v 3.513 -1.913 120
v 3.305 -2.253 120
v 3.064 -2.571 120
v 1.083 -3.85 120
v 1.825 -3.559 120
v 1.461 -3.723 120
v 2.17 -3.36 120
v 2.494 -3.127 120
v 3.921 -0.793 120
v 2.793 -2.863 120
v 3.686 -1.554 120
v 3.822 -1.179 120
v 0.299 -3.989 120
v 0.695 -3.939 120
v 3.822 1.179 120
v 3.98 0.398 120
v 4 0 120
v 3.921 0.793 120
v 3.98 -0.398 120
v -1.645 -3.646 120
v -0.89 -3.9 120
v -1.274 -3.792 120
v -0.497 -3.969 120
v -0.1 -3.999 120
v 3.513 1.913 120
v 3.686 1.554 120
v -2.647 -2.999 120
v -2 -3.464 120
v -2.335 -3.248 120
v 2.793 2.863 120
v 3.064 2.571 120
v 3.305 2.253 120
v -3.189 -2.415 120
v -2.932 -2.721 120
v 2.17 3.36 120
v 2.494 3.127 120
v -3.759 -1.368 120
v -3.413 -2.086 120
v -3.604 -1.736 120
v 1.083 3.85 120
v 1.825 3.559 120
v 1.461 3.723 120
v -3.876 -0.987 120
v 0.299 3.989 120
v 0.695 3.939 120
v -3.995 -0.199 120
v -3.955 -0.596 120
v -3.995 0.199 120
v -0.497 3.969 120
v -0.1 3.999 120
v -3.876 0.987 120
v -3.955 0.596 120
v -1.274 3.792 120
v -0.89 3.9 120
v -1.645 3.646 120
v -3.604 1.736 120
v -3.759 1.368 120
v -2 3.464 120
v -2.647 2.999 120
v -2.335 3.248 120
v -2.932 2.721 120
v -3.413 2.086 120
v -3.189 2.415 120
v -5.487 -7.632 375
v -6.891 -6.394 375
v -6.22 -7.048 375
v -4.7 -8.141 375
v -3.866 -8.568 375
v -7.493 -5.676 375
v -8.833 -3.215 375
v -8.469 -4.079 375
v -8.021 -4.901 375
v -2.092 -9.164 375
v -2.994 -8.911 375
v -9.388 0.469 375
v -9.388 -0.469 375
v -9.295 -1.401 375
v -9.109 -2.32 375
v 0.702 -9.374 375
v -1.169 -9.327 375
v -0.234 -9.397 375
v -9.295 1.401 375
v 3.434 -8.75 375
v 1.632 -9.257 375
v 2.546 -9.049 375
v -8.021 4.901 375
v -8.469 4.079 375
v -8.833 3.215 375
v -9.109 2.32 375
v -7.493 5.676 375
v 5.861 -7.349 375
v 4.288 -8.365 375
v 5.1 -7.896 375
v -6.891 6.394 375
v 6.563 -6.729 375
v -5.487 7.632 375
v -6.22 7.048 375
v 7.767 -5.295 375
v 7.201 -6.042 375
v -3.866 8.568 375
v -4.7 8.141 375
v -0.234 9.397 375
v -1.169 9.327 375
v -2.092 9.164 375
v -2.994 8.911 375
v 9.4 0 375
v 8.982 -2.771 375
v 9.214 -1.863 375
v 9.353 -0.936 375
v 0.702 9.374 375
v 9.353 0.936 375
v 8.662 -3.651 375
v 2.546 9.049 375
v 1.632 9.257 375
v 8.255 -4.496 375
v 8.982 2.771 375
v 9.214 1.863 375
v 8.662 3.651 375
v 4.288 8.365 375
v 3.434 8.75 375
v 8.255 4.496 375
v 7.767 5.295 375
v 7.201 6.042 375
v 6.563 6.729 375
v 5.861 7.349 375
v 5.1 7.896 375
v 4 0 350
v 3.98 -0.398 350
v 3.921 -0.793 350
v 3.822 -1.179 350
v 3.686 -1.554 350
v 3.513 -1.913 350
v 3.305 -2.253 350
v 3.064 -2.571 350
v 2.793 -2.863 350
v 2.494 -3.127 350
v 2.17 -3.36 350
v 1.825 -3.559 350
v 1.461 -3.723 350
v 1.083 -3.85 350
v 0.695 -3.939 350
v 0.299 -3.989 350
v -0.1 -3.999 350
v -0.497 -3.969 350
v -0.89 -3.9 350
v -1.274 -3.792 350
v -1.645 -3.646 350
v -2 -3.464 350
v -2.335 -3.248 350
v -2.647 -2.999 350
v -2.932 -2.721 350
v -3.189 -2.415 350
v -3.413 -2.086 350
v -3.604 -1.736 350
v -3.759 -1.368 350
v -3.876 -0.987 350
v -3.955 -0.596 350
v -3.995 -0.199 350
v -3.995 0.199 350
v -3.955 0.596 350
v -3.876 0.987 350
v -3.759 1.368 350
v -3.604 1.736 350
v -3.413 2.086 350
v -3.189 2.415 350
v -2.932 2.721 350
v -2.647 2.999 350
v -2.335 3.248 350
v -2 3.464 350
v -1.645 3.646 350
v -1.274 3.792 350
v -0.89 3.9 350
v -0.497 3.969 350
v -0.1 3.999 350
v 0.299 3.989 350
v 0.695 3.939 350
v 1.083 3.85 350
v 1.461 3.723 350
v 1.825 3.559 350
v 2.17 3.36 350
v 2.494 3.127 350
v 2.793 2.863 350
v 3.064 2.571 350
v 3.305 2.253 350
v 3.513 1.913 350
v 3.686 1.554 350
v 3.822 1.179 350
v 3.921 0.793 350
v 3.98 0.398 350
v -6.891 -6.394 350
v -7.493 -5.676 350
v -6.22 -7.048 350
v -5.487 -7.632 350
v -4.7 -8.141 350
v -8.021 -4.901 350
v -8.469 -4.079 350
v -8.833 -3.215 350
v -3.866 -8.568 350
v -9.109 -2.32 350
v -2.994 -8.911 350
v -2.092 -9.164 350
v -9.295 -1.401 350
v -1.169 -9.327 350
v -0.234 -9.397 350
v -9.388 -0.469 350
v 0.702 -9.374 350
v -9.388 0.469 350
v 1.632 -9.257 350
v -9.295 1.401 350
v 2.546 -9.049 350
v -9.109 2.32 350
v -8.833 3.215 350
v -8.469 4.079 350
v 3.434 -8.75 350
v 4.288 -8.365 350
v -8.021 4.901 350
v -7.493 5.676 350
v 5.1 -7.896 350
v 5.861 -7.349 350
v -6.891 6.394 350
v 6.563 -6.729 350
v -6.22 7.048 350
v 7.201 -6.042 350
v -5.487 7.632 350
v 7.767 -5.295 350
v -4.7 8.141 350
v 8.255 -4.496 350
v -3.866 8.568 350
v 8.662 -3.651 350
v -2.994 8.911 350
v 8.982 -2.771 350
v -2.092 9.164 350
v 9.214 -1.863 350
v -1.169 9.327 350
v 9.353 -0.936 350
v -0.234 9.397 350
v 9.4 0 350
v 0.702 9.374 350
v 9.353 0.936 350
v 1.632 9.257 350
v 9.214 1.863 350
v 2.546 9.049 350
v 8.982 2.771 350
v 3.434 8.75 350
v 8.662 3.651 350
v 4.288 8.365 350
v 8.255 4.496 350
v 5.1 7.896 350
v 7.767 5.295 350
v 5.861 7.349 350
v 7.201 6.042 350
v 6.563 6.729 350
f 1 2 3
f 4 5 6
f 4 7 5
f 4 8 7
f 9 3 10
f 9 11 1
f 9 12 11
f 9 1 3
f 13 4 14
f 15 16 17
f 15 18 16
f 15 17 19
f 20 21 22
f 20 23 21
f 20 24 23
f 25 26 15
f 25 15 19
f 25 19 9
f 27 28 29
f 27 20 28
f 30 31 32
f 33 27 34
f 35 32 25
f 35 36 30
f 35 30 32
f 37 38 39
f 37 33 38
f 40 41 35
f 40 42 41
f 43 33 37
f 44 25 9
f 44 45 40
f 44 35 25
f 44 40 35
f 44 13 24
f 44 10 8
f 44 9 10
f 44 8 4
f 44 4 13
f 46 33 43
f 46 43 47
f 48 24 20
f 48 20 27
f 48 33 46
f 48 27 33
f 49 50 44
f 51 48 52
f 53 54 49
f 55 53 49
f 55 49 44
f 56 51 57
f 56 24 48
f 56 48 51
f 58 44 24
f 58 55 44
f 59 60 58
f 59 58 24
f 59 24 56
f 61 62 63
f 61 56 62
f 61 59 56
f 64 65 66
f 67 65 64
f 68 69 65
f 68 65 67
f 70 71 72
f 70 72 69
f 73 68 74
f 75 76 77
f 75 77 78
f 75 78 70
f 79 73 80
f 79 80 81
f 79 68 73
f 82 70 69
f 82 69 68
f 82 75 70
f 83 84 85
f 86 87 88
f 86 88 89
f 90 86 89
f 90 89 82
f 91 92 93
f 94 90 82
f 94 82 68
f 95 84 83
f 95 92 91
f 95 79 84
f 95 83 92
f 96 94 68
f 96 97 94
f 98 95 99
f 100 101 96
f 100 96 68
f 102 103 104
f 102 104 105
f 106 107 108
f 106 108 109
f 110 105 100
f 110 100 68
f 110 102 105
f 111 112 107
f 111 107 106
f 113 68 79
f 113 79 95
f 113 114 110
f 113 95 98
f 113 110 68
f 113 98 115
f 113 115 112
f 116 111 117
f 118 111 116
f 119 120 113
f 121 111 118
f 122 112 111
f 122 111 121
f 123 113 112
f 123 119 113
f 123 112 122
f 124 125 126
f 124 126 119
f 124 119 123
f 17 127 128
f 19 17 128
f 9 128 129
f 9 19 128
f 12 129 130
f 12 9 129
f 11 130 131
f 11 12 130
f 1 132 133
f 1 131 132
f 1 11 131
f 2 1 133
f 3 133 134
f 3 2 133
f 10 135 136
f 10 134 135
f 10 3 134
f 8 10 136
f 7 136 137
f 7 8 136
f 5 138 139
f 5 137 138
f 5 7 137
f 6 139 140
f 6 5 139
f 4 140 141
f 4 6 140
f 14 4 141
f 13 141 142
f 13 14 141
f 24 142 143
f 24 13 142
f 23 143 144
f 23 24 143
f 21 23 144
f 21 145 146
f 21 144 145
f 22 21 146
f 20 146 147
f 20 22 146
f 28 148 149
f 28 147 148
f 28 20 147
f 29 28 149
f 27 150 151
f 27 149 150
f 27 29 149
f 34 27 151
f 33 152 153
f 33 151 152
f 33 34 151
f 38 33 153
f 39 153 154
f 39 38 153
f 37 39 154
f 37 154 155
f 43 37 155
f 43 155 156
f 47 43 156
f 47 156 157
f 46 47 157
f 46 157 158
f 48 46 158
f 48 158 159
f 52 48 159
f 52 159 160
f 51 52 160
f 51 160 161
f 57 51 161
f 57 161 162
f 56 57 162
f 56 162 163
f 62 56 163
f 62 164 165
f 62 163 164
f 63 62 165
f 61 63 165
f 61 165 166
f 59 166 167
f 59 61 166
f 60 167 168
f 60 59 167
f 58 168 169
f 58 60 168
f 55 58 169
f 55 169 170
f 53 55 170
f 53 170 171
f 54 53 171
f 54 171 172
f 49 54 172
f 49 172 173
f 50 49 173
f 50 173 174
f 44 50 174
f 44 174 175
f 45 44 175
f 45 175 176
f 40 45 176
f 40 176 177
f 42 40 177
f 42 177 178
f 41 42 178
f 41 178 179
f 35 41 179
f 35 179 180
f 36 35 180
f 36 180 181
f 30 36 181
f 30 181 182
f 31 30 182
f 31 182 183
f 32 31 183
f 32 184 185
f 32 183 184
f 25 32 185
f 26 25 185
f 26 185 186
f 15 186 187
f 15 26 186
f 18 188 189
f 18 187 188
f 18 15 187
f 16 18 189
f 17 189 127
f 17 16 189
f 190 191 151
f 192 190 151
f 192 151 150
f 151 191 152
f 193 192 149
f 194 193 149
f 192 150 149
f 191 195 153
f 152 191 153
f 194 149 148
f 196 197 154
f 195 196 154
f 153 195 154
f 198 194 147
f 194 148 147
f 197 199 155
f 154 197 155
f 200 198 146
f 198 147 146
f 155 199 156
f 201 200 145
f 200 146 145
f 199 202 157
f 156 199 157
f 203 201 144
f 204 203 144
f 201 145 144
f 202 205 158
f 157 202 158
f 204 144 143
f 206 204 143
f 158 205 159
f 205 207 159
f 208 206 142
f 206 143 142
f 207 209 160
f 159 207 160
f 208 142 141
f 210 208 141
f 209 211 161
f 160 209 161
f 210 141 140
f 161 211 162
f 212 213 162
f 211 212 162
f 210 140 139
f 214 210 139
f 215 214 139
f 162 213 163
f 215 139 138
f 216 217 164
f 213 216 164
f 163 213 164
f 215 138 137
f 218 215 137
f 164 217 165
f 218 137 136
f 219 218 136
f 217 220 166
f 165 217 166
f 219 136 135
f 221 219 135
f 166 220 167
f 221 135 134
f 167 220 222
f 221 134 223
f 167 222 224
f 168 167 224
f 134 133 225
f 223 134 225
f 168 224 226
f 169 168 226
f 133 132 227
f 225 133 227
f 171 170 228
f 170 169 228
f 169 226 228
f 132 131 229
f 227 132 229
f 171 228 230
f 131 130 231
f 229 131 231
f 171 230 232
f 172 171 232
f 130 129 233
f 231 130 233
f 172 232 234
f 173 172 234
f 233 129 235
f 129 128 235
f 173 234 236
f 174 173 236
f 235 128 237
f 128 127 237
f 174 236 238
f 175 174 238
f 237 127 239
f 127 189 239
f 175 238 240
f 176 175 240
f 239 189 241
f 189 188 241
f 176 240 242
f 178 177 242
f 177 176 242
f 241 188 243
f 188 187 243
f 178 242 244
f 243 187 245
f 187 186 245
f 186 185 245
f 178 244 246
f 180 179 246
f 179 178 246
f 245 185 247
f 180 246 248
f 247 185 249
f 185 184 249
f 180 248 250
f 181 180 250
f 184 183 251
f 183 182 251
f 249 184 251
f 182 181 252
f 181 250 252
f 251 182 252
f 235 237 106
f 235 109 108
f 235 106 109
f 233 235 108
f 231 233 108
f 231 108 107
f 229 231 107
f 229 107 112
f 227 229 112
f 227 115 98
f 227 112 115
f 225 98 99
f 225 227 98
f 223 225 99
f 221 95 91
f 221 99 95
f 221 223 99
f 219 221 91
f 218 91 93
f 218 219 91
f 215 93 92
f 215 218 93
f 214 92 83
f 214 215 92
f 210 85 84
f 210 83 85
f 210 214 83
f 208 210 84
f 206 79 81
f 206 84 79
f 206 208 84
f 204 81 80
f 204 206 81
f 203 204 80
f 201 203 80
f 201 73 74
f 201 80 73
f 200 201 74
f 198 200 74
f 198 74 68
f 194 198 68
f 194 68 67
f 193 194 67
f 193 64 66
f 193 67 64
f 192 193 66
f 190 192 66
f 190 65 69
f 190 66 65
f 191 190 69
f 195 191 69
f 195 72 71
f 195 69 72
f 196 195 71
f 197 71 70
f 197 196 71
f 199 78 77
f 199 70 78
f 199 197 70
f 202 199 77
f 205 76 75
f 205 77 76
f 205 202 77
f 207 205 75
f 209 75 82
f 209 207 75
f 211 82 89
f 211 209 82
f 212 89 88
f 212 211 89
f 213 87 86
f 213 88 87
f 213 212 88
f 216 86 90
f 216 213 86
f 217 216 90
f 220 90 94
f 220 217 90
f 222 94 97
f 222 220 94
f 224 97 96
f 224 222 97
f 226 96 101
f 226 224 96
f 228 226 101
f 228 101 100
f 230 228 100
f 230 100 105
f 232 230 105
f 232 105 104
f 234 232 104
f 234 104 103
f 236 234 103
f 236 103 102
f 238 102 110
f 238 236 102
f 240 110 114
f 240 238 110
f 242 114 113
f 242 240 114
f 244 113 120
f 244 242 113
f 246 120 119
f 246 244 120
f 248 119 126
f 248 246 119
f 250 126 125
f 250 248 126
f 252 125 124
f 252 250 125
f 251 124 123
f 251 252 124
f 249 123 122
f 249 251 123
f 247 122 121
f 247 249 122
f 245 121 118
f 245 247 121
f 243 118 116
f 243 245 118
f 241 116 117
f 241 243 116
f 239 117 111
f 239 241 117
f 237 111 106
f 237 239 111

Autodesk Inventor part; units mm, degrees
ref_plane "YZ Plane" through (0, 0, 0) normal (1, 0, 0) x (0, 1, 0)
ref_plane "XZ Plane" through (0, 0, 0) normal (0, 1, 0) x (-1, 0, 0)
ref_plane "XY Plane" through (0, 0, 0) normal (0, 0, 1) x (1, 0, 0)
sketch "Sketch1" plane through (0, 0, 0) normal (0, 0, 1) x (1, 0, 0)
  circle A0 centre (0, 0) radius 4
  dimension "d0" = 8
extrude "Extrusion1" add sketch "Sketch1" along normal blind 350
sketch "Sketch2" plane through (0, 0, 350) normal (0, 0, 1) x (1, 0, 0)
  circle A0 centre (0, 0) radius 9.4
  dimension "d3" = 18.8
extrude "Extrusion2" add sketch "Sketch2" along normal blind 25
thread "Thread1" size "M8x1.25" class "6g" standard "ANSI Metric M Profile" full length
sketch "Sketch3" plane through (0, 0, 0) normal (0, 0, -1) x (-1, 0, 0)
  circle A0 centre (0, 0) radius 4 projected
extrude "Extrusion3" cut sketch "Sketch3" against normal blind 120
properties part number "00_spindel_350mm"
